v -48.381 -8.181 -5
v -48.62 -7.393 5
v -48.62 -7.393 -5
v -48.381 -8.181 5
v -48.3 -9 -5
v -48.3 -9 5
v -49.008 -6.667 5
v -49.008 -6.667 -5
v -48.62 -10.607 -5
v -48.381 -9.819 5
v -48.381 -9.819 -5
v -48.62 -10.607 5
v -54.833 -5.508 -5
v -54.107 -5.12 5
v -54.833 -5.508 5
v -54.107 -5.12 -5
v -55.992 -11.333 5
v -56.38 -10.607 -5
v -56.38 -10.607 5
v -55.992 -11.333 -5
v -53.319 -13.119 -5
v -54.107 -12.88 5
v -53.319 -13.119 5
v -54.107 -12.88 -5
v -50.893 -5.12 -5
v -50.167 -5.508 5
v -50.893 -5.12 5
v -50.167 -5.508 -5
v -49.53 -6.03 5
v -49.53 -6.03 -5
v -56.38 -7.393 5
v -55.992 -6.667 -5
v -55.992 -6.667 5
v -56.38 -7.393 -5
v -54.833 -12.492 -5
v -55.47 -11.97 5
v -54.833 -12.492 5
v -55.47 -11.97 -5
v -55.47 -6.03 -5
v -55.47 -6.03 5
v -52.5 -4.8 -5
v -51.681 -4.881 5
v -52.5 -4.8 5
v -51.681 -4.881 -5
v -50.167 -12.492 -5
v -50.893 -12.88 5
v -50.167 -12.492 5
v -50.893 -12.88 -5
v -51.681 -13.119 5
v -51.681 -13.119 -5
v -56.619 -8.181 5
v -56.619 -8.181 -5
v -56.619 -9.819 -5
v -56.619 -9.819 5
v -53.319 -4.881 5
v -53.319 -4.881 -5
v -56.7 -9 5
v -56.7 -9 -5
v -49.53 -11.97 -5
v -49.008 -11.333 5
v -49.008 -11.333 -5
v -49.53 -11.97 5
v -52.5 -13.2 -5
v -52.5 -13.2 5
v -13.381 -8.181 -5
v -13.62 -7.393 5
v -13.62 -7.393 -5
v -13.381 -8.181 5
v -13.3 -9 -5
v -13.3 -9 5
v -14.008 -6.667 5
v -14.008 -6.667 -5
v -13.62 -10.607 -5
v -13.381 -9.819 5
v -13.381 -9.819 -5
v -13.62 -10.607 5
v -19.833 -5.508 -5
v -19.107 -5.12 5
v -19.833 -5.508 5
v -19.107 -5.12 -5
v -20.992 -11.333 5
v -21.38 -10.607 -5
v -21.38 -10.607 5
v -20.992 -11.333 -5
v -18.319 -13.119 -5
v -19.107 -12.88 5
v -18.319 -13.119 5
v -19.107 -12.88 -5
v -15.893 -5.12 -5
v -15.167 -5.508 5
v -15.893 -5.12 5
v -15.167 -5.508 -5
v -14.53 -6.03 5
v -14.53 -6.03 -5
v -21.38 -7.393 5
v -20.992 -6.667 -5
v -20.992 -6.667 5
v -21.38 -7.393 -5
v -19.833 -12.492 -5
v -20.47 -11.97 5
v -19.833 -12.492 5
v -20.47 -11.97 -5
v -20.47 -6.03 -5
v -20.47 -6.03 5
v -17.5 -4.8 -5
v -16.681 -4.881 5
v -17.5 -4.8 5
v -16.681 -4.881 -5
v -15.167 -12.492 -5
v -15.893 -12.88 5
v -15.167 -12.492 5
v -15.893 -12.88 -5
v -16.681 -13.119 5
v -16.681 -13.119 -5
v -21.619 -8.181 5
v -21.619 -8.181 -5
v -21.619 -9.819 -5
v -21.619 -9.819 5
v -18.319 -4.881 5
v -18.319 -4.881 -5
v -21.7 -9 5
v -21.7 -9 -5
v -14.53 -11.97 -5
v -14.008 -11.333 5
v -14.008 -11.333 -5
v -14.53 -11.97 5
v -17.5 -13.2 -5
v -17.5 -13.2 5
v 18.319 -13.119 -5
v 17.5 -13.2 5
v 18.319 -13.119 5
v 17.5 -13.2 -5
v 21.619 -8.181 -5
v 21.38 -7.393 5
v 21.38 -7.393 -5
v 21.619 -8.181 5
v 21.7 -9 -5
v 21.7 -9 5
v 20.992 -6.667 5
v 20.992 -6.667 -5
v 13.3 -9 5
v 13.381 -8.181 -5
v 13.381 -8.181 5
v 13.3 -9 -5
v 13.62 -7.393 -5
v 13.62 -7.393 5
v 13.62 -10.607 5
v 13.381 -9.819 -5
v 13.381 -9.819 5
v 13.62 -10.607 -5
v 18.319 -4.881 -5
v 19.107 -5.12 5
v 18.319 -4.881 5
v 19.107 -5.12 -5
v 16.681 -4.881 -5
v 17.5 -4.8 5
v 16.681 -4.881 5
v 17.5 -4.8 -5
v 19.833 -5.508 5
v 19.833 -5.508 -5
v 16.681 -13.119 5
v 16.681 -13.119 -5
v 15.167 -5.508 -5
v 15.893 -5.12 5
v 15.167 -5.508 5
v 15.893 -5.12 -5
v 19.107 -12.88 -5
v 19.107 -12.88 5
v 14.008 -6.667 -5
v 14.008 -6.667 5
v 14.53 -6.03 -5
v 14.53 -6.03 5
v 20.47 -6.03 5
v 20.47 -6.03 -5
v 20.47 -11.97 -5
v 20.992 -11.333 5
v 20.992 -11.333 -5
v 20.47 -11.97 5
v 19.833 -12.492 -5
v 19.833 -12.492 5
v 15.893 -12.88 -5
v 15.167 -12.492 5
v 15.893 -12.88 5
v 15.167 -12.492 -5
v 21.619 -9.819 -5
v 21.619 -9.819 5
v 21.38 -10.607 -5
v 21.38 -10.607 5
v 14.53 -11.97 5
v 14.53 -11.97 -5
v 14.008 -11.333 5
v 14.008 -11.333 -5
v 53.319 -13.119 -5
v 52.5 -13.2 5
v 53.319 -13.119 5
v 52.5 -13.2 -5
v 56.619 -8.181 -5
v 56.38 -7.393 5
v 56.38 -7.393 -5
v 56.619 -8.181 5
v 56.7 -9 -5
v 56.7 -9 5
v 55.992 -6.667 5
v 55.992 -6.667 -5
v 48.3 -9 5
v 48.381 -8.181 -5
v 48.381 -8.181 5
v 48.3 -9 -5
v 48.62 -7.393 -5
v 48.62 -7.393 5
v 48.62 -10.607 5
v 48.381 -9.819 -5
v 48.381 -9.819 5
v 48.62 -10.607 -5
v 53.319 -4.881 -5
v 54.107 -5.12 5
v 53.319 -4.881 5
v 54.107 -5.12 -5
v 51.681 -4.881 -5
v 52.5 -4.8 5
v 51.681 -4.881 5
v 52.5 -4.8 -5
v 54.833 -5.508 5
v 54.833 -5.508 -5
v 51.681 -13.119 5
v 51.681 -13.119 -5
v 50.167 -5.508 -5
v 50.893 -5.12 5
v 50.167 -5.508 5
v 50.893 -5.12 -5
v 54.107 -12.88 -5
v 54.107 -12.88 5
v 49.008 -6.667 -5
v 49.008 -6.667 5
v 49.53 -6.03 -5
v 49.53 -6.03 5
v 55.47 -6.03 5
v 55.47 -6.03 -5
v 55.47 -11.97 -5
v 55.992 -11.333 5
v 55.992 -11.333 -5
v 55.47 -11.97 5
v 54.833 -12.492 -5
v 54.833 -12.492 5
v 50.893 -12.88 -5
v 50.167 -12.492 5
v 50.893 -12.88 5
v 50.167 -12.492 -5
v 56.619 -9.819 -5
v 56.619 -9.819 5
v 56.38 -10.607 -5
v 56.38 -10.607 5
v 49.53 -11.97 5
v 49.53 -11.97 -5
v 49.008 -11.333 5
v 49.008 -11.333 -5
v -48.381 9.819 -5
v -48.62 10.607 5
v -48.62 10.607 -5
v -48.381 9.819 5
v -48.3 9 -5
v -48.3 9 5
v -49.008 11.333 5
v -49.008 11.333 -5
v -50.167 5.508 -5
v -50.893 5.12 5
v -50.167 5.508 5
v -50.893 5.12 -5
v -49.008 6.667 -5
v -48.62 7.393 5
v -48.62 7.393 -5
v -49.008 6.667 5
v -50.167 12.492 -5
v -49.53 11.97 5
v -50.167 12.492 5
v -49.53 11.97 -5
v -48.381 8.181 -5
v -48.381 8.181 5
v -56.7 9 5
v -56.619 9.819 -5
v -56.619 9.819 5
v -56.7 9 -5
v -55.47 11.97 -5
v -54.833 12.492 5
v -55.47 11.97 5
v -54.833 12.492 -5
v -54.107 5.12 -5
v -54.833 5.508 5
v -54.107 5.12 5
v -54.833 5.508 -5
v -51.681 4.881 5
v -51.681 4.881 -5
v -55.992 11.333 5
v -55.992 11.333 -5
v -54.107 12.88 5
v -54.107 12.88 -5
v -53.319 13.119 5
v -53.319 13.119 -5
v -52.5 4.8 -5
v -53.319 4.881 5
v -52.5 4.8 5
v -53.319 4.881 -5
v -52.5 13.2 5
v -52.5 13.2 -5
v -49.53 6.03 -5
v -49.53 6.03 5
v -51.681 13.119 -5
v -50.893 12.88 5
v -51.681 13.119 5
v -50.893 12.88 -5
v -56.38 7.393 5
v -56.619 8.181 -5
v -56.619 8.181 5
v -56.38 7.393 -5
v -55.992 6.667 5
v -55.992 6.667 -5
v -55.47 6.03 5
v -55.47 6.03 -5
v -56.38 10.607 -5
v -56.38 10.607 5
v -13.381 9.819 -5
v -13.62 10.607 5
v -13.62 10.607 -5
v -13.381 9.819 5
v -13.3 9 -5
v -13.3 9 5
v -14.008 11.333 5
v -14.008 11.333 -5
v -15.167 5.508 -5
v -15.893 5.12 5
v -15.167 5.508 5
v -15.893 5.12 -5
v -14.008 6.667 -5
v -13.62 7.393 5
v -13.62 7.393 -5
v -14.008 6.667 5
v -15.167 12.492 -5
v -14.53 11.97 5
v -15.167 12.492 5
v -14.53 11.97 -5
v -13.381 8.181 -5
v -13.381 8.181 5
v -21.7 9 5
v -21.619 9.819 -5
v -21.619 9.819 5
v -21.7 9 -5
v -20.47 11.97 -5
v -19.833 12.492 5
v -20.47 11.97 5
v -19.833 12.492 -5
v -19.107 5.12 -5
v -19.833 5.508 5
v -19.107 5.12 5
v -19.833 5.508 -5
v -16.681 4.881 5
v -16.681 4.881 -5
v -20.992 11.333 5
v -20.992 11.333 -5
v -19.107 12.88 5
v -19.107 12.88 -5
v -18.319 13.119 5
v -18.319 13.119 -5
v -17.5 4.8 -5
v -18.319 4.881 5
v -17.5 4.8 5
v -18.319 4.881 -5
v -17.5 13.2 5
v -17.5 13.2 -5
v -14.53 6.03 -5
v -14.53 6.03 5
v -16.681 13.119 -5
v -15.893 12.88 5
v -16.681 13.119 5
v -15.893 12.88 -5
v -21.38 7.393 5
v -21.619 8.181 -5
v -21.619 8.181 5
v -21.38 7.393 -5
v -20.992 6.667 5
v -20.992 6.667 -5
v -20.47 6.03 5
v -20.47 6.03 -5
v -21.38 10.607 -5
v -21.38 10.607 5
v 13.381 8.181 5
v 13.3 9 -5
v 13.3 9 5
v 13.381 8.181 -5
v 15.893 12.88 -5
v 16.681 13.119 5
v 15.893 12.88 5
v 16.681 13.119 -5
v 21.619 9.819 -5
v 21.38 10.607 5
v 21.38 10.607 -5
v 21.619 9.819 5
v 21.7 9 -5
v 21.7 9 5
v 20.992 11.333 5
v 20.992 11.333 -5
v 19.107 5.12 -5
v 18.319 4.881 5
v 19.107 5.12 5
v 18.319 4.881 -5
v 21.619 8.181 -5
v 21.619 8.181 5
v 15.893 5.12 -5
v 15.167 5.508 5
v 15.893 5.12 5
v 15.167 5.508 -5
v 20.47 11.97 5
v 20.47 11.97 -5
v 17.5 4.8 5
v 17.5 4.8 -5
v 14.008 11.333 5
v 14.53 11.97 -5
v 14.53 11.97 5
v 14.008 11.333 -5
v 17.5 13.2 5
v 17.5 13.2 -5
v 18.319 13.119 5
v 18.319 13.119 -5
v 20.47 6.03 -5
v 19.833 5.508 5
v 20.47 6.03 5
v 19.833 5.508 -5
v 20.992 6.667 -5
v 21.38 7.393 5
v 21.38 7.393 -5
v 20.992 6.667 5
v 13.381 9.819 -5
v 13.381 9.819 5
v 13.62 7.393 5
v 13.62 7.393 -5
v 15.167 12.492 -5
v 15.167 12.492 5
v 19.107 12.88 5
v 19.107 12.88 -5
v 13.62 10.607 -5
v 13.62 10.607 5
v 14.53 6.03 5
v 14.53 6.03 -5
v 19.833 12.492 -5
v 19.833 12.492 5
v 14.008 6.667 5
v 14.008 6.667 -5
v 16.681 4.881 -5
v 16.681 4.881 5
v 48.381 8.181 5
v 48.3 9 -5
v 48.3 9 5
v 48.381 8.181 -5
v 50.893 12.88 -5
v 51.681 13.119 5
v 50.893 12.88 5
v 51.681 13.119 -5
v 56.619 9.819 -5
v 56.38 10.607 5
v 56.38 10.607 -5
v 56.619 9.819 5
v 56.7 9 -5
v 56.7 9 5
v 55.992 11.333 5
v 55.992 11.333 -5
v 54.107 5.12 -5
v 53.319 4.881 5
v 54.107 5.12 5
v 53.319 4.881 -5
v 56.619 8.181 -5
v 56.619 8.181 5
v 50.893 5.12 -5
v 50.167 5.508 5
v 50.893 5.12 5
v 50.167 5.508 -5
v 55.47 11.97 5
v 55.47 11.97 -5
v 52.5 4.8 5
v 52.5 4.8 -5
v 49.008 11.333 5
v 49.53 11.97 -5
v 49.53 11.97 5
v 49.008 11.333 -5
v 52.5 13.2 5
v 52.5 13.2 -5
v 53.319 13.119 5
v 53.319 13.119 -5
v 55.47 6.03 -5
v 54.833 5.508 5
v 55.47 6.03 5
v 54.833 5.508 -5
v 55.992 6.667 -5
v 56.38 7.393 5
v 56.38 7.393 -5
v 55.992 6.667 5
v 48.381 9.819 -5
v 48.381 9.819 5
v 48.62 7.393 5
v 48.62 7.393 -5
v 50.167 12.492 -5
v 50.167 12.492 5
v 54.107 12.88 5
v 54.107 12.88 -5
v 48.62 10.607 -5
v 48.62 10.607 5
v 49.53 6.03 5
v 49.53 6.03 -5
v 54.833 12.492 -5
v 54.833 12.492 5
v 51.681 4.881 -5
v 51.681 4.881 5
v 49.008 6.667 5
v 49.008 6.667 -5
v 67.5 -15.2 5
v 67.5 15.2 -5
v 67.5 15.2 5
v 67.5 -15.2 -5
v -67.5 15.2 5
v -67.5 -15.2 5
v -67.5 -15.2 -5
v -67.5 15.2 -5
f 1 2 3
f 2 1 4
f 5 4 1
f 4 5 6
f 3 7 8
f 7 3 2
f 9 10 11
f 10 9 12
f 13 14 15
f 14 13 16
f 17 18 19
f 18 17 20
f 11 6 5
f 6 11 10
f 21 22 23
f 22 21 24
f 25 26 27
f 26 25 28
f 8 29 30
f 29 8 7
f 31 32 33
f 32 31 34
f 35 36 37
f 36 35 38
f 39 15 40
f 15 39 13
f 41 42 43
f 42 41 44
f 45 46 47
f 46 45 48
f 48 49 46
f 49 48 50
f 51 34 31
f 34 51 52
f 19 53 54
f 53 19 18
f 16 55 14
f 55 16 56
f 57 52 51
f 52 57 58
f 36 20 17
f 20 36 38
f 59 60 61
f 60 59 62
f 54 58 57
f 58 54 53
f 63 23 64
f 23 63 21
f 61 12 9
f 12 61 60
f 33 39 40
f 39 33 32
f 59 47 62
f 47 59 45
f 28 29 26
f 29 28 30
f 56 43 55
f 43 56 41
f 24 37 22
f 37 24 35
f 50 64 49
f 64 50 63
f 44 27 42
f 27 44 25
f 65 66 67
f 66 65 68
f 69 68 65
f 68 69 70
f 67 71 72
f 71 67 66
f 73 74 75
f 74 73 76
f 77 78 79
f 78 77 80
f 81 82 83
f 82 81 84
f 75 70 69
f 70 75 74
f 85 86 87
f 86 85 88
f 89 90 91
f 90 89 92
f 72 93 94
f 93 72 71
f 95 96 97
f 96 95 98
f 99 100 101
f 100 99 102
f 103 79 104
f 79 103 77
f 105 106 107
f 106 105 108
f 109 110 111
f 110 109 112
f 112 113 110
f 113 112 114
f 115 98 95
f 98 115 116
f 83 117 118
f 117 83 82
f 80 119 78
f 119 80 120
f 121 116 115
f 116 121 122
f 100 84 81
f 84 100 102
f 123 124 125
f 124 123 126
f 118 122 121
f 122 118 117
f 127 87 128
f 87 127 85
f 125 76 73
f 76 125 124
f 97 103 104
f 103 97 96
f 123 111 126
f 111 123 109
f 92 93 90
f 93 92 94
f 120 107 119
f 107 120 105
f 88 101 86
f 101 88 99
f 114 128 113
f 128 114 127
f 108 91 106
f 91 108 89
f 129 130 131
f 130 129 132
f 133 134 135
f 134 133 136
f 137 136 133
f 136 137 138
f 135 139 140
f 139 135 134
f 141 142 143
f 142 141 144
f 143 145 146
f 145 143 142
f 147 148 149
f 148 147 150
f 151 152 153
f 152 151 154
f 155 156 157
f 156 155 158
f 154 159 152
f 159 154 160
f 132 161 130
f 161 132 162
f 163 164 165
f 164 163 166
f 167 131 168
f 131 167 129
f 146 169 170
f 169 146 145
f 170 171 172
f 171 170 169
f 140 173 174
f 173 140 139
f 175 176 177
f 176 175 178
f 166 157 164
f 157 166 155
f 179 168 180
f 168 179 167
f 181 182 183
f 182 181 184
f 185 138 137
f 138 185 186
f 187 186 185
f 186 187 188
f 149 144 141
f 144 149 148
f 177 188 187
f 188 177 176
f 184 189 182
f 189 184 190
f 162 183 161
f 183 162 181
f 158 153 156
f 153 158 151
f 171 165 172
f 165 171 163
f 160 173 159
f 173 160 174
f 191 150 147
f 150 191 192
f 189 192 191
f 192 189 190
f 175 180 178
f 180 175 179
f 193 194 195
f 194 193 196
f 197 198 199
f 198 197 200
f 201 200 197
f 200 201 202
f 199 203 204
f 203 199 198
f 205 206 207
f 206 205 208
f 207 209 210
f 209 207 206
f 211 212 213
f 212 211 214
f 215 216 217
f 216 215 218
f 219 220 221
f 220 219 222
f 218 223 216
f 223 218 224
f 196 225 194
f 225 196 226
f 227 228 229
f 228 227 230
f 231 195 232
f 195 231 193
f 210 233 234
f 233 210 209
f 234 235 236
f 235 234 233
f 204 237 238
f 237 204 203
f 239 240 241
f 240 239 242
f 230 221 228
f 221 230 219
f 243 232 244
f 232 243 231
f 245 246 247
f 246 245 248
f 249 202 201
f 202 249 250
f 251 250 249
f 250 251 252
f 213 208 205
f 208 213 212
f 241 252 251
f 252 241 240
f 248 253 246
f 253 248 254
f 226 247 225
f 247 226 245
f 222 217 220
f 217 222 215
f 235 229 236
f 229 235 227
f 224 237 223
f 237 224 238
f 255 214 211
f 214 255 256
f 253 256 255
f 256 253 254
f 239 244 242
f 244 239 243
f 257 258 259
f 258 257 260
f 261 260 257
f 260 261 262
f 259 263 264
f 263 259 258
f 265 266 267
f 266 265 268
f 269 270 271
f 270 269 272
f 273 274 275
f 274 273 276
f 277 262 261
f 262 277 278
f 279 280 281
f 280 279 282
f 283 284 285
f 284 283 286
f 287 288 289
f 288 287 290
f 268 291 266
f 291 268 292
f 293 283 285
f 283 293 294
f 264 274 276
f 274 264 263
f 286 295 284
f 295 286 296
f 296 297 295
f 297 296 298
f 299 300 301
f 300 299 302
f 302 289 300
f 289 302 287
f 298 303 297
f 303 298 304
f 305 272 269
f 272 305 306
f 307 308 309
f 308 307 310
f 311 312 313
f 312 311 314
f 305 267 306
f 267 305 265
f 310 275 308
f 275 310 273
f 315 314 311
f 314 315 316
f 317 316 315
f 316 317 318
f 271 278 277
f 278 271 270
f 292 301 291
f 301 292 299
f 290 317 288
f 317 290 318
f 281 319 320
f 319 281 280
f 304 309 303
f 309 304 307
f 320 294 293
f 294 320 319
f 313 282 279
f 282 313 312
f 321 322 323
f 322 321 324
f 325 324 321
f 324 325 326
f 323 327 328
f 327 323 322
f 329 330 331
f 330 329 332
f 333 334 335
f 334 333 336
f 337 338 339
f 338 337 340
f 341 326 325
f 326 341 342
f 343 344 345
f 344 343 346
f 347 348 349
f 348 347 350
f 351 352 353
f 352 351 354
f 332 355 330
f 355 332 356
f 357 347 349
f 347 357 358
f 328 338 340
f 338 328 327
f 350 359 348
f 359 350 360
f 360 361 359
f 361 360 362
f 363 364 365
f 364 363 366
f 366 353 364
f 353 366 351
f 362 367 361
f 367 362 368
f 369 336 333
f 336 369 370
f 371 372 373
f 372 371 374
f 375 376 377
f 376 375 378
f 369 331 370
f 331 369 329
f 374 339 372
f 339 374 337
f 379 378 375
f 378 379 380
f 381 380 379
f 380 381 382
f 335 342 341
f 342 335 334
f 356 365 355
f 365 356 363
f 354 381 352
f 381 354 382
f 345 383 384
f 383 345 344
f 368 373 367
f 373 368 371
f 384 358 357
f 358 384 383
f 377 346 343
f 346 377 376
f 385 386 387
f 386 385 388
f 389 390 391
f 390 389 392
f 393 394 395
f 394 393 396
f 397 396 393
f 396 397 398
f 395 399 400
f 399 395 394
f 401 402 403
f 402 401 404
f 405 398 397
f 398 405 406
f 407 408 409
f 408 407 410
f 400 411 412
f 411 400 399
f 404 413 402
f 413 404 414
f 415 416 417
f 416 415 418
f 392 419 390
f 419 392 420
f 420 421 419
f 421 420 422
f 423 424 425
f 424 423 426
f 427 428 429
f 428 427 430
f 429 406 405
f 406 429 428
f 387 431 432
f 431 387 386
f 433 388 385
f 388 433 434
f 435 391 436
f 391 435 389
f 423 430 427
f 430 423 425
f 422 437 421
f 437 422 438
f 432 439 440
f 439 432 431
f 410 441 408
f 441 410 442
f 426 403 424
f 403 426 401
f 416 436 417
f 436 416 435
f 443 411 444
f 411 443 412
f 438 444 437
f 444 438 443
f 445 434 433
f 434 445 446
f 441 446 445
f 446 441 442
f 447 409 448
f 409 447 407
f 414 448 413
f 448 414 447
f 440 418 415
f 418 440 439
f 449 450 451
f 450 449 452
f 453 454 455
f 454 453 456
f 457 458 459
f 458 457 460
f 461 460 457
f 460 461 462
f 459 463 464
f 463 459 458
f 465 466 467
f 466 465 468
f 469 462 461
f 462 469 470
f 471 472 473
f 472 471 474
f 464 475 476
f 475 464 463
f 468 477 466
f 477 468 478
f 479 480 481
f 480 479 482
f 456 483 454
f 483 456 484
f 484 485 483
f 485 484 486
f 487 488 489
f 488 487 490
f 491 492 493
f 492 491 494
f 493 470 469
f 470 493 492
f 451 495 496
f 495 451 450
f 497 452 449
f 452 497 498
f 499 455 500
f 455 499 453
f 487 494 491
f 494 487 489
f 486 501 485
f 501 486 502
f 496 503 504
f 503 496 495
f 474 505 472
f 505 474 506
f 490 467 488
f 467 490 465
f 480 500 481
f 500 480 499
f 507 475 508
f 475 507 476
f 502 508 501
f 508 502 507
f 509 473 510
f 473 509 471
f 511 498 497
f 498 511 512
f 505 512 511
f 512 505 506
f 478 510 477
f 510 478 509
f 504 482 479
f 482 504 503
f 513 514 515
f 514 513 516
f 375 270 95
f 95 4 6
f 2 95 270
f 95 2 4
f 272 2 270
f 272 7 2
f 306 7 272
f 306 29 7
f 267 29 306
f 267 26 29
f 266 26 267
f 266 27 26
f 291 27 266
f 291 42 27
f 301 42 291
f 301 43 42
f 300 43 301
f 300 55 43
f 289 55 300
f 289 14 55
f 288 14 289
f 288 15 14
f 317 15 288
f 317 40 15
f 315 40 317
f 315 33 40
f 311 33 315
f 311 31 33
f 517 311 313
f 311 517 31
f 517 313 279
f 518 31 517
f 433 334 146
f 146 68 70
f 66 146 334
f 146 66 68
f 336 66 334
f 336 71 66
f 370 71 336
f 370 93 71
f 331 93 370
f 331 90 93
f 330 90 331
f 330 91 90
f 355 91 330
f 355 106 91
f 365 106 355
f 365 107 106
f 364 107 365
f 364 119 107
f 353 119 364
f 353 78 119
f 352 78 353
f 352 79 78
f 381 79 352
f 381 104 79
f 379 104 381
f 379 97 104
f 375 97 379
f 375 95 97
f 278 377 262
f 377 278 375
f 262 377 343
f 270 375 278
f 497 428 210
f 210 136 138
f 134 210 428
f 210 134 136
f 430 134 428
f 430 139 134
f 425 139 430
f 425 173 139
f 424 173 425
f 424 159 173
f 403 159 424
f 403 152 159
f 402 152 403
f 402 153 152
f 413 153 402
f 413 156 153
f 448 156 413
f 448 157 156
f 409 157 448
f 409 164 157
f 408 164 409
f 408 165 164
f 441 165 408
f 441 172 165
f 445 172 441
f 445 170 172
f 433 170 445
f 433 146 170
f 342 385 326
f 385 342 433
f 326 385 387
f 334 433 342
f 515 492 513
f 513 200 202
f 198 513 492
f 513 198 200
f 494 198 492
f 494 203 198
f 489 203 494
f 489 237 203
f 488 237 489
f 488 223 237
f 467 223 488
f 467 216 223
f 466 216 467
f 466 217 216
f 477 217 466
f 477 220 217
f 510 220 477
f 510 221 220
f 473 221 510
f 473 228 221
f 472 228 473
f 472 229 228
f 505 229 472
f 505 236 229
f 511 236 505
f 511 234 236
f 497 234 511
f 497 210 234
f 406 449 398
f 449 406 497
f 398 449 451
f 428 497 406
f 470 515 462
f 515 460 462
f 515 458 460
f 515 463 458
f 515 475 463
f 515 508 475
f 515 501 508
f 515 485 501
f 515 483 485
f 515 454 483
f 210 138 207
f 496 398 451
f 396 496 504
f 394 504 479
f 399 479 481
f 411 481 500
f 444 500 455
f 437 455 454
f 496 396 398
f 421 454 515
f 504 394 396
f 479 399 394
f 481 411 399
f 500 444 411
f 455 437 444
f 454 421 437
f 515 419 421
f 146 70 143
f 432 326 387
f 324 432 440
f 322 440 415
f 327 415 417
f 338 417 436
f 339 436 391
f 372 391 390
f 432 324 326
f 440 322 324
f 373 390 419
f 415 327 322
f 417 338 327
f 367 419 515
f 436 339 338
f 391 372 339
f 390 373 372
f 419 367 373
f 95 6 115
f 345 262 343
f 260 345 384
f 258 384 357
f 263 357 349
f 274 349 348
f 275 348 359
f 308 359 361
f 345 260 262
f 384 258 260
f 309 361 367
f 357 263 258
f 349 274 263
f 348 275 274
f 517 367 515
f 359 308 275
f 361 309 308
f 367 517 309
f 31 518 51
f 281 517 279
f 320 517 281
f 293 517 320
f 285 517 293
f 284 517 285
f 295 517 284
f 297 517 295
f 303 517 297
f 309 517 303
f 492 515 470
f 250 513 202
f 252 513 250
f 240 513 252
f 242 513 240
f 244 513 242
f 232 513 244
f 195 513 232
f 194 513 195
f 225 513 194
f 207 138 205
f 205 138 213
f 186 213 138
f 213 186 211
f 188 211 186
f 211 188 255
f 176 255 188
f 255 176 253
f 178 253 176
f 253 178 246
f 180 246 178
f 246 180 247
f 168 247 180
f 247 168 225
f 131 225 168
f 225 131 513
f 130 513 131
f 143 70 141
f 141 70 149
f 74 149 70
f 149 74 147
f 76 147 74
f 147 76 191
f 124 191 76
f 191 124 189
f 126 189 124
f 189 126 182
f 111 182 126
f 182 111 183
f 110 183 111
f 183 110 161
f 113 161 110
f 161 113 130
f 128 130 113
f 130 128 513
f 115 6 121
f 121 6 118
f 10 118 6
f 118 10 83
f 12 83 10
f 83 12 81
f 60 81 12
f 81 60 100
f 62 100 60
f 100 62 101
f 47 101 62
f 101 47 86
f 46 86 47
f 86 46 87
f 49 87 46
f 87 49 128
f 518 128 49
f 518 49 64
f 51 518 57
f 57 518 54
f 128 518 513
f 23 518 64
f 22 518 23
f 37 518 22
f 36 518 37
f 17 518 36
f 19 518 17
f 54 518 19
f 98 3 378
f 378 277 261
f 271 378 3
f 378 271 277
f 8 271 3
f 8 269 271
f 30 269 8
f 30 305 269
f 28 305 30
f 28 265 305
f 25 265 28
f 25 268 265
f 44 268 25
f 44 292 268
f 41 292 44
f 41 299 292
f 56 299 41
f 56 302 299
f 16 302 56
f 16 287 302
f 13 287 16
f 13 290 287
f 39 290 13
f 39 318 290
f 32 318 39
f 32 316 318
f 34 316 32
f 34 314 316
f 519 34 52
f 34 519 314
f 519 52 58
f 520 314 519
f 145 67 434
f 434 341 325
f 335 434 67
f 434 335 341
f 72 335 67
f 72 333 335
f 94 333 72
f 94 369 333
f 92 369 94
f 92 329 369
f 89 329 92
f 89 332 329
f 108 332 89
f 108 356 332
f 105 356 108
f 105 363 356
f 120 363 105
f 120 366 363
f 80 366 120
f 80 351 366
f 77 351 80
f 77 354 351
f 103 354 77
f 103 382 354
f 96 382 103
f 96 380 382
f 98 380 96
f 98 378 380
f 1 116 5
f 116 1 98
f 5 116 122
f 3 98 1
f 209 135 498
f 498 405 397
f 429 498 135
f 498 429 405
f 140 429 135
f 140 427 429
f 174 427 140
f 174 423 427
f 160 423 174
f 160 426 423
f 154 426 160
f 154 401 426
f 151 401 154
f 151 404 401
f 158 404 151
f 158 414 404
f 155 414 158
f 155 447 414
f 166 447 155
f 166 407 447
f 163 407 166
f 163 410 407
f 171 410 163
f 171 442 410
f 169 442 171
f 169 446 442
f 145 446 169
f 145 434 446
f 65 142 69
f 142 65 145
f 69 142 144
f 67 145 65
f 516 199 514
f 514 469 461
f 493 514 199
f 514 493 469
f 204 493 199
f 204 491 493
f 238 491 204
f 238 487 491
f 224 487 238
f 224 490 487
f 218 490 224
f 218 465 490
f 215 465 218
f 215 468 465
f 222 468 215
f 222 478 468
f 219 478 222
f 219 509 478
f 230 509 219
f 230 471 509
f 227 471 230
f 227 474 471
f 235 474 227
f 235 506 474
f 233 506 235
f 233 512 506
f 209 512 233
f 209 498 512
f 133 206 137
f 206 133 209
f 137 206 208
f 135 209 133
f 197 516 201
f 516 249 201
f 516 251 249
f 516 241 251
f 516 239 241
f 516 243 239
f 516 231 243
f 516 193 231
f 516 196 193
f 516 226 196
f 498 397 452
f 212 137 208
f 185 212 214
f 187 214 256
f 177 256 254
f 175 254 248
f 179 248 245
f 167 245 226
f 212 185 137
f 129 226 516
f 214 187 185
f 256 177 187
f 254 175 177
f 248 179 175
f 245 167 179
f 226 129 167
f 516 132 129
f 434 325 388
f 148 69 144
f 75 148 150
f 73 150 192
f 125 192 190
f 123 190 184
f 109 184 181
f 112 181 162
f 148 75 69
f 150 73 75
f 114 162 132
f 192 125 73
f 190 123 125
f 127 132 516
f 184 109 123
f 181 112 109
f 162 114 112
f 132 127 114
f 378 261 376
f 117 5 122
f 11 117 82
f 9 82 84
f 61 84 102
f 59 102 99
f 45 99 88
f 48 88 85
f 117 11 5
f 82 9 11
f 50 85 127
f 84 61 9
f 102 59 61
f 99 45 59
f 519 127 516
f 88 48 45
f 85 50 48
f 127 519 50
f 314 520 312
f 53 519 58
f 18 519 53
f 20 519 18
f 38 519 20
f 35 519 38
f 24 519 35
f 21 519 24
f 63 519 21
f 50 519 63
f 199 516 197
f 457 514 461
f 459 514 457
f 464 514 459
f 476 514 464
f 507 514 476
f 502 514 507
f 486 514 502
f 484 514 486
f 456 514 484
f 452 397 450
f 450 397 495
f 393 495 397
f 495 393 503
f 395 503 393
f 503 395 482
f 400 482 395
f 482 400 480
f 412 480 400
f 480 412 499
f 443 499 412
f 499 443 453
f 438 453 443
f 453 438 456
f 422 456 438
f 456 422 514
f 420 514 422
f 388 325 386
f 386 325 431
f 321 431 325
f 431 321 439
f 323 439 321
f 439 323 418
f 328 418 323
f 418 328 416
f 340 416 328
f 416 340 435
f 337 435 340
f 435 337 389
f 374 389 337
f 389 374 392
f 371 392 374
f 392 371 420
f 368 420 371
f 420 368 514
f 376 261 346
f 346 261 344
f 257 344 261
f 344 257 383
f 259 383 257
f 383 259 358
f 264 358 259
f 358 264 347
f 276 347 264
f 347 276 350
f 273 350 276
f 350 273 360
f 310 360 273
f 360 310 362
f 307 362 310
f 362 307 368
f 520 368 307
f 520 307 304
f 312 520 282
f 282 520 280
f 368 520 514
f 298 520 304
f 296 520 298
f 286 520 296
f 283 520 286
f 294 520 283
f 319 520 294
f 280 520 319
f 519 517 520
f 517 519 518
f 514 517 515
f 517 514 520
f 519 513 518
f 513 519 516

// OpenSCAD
$fn = 32;

// ----------------------------------------------------------------------
// Hole bar, 4 x Ø8.4
// tworows layout, 15 mm edge offset
// ----------------------------------------------------------------------

// --- parameters (mm) ---
bar_w = 30.4;     // bar width (Y)
bar_t = 10;       // bar thickness (Z)
holes = 4;        // holes per row
hole_d = 8.4;     // hole diameter
edge = 15;        // offset from the bar end to the first hole
pitch = 35;       // pitch between neighbouring holes
row_offset = 18;  // distance between the two rows

// --- derived feature positions (mm) ---
span = (holes - 1) * pitch;   // = 105   distance between the end holes
bar_l = span + 2 * edge;      // = 135   overall bar length
start_x = -bar_l / 2 + edge;  // = -52.5   X of the first hole
feature_centers = [
  [start_x + 0 * pitch, -row_offset / 2],
  [start_x + 1 * pitch, -row_offset / 2],
  [start_x + 2 * pitch, -row_offset / 2],
  [start_x + 3 * pitch, -row_offset / 2]
];   // hole centres of the first row
row2_centers = [
  [start_x + 0 * pitch, row_offset / 2],
  [start_x + 1 * pitch, row_offset / 2],
  [start_x + 2 * pitch, row_offset / 2],
  [start_x + 3 * pitch, row_offset / 2]
];   // hole centres of the second row

// bar with two rows of holes, both read from their own centre arrays
difference() {
  translate([-bar_l / 2, -bar_w / 2, -bar_t / 2]) cube([bar_l, bar_w, bar_t]);
  for (centre = feature_centers)
    translate([centre[0], centre[1], 0])
      cylinder(d = hole_d, h = bar_t + 2, center = true);
  for (centre = row2_centers)
    translate([centre[0], centre[1], 0])
      cylinder(d = hole_d, h = bar_t + 2, center = true);
}
